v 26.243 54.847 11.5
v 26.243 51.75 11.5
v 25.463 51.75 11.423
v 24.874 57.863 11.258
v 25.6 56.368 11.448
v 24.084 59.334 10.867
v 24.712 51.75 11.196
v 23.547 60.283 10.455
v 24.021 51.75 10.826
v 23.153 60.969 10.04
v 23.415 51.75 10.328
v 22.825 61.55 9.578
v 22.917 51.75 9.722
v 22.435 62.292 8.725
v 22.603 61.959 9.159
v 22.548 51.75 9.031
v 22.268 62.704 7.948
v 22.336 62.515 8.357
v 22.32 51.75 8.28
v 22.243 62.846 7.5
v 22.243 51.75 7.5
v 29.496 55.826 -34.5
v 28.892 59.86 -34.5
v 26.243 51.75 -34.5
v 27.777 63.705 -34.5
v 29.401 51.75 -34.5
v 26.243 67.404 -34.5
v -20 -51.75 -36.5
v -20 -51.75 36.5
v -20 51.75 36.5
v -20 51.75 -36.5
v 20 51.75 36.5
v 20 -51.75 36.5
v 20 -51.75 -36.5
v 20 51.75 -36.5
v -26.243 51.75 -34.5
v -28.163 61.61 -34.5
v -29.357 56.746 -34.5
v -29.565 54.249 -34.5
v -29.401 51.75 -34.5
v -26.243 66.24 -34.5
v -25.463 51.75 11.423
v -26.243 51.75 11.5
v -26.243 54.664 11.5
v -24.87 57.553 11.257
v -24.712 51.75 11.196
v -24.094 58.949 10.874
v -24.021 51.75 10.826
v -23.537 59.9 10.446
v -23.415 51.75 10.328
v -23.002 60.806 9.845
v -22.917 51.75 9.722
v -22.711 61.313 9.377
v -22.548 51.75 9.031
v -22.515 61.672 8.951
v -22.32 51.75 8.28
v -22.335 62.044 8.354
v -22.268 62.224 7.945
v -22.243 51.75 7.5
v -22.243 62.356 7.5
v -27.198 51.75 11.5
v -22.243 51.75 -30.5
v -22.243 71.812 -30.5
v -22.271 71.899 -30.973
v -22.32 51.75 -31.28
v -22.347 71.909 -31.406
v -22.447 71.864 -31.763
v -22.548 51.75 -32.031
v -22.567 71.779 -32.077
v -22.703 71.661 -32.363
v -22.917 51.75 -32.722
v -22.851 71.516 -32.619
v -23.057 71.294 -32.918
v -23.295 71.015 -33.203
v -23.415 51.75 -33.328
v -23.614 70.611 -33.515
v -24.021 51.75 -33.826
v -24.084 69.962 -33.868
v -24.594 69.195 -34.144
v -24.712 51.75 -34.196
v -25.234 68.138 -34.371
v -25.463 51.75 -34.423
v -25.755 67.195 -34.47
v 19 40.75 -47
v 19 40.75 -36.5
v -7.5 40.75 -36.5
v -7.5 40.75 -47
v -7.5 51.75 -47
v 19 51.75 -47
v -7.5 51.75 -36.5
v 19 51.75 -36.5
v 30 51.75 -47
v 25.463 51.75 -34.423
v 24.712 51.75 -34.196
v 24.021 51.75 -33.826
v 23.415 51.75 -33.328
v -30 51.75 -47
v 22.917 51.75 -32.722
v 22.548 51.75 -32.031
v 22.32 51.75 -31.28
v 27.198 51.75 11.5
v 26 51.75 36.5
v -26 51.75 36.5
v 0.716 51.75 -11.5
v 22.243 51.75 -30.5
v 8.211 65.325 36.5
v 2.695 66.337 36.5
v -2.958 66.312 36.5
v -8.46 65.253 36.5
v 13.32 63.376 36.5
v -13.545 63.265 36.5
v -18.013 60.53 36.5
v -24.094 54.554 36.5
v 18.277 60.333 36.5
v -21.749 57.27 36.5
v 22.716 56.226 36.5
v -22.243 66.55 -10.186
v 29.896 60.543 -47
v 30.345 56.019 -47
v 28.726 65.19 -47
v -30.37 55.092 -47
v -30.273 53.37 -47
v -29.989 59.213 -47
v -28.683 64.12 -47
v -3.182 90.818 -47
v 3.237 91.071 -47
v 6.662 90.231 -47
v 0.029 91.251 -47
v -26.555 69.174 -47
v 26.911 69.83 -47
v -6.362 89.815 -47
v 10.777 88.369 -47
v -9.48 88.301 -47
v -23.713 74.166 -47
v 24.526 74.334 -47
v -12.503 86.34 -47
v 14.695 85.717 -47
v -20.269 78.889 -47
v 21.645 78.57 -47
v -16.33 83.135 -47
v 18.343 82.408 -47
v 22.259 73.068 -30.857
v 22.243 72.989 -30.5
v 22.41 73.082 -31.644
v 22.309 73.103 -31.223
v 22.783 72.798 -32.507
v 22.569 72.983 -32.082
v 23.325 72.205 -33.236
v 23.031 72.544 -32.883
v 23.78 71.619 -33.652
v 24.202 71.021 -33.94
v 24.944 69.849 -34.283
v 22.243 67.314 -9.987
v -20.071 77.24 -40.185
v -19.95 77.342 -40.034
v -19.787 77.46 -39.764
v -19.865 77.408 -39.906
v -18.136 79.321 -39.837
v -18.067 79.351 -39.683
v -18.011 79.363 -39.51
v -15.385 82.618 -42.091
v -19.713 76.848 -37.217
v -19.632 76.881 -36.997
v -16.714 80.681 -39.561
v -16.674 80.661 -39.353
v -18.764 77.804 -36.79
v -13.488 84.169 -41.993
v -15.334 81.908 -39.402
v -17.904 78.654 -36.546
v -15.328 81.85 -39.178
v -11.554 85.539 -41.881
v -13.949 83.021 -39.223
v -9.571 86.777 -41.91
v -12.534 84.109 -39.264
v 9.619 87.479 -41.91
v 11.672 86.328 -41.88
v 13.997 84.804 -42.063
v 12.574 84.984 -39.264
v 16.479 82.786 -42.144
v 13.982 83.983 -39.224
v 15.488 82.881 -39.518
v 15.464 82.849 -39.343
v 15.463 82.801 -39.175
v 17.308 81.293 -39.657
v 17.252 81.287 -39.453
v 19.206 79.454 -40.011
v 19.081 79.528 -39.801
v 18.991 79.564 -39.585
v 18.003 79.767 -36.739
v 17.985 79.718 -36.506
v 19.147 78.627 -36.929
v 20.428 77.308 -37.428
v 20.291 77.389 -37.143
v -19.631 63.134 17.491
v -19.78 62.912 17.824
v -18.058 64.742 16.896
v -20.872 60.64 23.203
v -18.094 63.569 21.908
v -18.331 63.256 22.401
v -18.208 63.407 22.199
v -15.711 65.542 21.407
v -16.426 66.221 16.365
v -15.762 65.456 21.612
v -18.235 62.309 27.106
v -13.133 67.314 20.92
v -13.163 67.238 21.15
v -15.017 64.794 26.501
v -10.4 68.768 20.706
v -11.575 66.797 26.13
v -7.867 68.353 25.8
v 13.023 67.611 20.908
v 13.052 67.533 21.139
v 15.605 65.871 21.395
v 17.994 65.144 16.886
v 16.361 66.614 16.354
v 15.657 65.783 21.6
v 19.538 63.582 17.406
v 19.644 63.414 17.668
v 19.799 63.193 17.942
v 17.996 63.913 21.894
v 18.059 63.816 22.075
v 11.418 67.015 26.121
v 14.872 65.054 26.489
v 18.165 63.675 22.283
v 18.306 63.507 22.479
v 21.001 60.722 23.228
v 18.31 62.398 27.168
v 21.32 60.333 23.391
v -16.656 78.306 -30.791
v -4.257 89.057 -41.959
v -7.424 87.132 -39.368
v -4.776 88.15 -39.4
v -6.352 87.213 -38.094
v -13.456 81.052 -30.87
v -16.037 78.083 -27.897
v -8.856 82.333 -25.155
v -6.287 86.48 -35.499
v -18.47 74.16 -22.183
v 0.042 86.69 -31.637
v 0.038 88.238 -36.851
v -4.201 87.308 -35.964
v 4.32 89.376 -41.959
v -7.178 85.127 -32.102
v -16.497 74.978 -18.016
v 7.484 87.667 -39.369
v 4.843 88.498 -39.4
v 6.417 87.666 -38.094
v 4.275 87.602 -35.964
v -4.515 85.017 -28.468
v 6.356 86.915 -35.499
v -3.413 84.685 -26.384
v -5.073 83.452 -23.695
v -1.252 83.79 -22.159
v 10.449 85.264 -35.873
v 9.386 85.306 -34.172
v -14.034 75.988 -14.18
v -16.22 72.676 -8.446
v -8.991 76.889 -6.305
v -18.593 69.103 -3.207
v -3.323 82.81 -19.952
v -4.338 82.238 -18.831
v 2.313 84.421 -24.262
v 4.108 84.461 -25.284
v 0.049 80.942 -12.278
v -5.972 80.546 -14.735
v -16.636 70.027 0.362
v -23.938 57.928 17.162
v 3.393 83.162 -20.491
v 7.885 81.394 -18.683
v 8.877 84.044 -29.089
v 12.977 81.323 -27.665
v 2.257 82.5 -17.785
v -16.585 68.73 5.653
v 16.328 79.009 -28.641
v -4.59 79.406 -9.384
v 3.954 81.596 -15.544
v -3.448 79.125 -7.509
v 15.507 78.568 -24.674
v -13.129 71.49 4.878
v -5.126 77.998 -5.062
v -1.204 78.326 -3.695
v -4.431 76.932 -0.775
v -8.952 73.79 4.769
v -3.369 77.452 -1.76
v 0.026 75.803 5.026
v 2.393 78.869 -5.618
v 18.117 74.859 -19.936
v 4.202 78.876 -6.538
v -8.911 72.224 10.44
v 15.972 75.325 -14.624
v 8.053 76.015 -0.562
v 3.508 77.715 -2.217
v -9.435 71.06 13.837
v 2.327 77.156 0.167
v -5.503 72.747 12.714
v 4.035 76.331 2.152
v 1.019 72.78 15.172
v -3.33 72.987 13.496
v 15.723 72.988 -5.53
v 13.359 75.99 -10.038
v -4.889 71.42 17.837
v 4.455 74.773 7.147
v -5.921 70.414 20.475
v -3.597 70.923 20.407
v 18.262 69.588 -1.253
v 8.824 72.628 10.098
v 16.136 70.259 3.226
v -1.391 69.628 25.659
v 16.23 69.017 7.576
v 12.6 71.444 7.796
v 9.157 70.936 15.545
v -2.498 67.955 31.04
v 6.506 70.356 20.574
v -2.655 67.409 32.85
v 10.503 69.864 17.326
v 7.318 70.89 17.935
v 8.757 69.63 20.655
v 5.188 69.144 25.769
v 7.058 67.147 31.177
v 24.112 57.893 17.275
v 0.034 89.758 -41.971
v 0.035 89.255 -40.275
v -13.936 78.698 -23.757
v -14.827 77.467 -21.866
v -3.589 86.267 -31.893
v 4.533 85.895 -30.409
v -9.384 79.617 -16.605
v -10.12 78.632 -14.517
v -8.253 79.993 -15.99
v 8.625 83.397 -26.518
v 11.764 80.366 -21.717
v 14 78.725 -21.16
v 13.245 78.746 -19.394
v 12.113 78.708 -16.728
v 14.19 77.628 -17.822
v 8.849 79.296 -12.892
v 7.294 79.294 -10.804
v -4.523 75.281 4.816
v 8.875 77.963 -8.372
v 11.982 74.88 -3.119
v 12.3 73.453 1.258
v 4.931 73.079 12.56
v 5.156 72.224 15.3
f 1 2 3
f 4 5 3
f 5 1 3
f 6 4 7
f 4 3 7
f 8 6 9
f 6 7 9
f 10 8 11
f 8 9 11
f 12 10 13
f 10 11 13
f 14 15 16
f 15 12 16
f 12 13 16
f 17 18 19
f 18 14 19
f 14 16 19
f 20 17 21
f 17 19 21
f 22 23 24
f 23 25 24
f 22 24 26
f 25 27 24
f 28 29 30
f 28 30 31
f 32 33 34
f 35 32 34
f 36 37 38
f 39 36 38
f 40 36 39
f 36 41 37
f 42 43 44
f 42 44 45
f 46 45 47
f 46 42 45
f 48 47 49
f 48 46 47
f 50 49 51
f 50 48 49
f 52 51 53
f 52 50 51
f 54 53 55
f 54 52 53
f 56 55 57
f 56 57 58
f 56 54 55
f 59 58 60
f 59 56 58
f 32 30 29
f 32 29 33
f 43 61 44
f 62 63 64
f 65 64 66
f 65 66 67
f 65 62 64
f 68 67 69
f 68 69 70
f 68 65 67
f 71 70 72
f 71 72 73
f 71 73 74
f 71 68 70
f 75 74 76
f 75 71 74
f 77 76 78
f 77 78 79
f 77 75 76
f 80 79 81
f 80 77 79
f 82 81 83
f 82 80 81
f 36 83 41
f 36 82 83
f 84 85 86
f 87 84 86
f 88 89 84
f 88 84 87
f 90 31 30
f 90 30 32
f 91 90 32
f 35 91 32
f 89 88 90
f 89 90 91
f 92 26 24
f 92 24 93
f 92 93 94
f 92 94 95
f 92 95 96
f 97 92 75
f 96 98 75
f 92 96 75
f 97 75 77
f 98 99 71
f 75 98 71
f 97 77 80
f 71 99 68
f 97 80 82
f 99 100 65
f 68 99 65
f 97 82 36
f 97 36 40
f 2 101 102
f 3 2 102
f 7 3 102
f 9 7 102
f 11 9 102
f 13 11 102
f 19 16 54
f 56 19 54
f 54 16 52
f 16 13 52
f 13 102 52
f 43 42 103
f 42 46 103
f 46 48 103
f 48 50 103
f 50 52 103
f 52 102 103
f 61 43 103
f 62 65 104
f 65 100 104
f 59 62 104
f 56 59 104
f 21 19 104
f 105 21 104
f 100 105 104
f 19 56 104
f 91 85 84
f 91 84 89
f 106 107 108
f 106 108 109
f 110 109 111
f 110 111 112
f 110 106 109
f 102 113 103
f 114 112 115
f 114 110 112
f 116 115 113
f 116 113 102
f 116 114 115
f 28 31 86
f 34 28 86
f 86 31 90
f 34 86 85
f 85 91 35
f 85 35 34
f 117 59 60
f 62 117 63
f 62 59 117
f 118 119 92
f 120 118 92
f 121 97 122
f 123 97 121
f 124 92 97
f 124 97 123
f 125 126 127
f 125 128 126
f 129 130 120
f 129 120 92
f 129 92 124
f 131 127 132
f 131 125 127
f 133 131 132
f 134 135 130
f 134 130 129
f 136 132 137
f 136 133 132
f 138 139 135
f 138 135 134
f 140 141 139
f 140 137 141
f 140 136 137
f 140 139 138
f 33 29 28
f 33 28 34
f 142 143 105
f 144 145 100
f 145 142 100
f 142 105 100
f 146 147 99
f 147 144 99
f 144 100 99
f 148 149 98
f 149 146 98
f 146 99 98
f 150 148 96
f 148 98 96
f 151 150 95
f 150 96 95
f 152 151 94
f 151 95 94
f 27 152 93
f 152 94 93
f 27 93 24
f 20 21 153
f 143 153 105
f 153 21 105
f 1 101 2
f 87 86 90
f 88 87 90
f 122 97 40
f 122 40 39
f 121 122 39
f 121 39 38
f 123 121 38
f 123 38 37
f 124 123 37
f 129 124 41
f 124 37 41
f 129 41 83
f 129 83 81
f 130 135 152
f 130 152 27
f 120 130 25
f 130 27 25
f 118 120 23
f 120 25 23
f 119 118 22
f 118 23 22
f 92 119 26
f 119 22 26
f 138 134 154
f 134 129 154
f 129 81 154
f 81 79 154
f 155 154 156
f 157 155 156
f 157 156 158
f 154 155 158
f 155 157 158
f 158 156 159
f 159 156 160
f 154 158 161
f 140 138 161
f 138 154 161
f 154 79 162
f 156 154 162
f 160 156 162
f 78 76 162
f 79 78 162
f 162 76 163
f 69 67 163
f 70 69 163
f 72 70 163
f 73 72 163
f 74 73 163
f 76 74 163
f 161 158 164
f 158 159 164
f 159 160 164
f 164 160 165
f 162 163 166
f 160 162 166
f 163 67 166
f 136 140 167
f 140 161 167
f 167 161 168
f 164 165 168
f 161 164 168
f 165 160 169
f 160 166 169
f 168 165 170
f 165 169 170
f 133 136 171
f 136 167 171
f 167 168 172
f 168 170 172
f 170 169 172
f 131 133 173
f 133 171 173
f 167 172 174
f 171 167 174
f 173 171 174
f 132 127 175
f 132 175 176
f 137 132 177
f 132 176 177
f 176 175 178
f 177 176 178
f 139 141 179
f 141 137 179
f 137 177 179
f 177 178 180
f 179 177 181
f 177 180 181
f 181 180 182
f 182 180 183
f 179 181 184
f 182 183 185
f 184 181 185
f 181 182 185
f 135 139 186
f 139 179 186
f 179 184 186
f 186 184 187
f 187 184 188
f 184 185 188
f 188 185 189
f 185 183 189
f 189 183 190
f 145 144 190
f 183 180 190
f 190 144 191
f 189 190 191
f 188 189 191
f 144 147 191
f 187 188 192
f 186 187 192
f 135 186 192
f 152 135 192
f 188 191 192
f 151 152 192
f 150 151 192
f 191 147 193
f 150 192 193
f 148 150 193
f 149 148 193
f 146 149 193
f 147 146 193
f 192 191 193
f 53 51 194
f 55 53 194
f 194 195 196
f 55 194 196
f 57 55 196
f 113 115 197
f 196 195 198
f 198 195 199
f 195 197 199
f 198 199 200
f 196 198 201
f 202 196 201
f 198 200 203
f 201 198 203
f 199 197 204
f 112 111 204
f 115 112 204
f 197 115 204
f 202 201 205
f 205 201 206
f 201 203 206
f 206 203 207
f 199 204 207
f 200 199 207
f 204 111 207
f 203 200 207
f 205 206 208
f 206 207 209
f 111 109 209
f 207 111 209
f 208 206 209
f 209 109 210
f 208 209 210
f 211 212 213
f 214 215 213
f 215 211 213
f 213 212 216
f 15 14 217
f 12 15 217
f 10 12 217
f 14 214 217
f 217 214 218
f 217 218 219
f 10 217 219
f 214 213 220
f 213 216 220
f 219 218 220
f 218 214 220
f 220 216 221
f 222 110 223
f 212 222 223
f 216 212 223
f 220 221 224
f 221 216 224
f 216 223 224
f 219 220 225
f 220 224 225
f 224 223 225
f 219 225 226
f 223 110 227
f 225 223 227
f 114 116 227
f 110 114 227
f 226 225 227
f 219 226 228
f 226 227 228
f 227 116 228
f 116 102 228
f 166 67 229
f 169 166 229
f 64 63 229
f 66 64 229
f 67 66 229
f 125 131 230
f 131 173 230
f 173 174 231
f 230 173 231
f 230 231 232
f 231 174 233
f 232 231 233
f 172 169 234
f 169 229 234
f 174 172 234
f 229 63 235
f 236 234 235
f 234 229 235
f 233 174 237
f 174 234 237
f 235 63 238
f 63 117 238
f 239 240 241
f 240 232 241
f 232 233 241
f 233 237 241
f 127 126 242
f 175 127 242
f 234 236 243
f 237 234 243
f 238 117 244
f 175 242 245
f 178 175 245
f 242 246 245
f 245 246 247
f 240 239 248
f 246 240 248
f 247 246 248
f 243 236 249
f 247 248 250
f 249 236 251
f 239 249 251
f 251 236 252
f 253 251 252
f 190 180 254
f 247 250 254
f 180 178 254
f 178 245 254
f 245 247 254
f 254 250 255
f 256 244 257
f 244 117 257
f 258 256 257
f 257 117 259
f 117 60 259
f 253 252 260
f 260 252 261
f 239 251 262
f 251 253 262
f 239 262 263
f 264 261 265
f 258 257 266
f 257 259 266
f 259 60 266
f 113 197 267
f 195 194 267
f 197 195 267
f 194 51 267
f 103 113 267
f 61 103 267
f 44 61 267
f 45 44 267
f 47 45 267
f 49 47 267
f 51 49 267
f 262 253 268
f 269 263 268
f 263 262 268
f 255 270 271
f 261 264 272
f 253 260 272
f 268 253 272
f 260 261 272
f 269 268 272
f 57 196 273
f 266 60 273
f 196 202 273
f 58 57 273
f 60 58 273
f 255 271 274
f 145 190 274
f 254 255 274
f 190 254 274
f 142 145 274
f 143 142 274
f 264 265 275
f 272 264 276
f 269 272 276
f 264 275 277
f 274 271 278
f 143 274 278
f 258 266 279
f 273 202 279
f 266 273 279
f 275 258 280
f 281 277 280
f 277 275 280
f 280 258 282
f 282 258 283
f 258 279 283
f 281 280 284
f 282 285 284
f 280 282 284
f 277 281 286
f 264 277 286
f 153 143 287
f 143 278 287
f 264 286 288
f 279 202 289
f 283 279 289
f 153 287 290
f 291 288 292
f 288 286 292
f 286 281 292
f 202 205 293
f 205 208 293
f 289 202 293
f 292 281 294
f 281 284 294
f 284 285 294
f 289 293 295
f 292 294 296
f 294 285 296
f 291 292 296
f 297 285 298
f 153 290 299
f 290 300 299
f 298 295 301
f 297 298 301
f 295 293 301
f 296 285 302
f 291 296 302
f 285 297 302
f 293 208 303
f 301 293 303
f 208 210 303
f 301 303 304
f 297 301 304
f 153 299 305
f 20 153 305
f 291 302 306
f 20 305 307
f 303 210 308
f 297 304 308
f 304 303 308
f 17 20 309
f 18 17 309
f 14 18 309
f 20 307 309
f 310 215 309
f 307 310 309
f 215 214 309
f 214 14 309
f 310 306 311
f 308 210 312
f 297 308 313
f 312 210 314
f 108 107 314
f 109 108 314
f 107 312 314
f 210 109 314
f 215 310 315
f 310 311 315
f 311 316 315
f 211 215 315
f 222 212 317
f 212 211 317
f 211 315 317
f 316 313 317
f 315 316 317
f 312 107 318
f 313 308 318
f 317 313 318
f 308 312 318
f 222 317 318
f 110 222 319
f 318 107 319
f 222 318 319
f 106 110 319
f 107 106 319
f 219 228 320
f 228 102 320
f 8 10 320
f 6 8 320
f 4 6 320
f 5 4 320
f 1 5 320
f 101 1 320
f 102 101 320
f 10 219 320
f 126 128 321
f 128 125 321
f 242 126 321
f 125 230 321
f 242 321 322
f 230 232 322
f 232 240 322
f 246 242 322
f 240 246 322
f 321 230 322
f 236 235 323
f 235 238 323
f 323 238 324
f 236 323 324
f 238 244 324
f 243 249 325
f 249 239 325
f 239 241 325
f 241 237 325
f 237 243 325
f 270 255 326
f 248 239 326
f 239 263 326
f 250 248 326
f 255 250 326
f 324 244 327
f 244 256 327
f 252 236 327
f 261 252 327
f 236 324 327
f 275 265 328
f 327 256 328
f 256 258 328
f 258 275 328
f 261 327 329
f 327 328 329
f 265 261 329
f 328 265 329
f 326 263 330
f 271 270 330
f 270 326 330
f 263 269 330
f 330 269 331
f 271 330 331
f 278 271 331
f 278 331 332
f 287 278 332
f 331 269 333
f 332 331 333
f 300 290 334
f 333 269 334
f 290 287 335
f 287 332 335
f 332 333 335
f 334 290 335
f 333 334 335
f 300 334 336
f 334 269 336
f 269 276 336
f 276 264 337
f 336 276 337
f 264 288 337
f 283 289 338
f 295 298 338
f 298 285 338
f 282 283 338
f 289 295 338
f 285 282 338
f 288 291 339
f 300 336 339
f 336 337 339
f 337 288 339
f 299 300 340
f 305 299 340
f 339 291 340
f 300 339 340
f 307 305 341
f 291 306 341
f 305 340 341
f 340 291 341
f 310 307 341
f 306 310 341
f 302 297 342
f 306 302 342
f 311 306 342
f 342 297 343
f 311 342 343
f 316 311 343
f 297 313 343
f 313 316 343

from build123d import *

# Parameters (mm, degrees)
SKETCH_1_W          = 40
SKETCH_1_H          = 73
EXTRUDE_1_DEPTH     = 51.75
SKETCH_2_W          = 26.5
SKETCH_2_H          = 11
EXTRUDE_2_DEPTH     = 10.5
CUT_EXTRUDE_1_DEPTH = 118.658825115


with BuildPart() as part:
    # 草图1 → 凸台-拉伸1 (new, symmetric)
    with BuildSketch(Plane(origin=(0, 0, 0), x_dir=(1, 0, 0), z_dir=(0, 1, 0))):
        Rectangle(SKETCH_1_W, SKETCH_1_H)
    extrude(amount=EXTRUDE_1_DEPTH, both=True)

    # 草图2 → 凸台-拉伸2 (add)
    with BuildSketch(Plane(origin=(0, 0, -36.5), x_dir=(-1, 0, 0), z_dir=(0, 0, -1))):
        with Locations((-5.75, 46.25)):
            Rectangle(SKETCH_2_W, SKETCH_2_H)
    extrude(amount=EXTRUDE_2_DEPTH)


with BuildPart() as body_2:
    # 草图3 → 放样1 section 0
    with BuildSketch(Plane(origin=(0, 0, -47), x_dir=(-1, 0, 0), z_dir=(0, 0, -1))):
        with BuildLine():
            Line((-30, 51.75), (30, 51.75))
            add(Edge.make_bspline(
                [(-30, 51.75), (-32.960840364, 67.552970125), (-0.122307099, 116.257852524), (33.072086404, 64.936710937), (30, 51.75)],
                knots=[0, 0, 0, 0, 0.500504929, 1, 1, 1, 1], degree=3))
        make_face()
    # 草图4 for 放样1 → 放样1 section 1
    with BuildSketch(Plane.XY.offset(36.5)):
        with BuildLine():
            Line((-26, 51.75), (26, 51.75))
            # circular arc as an exact rational Bezier (weights 1, cos(half-angle), 1)
            Bezier((26, 51.75), (0, 95.0040341), (-26, 51.75), weights=[1, 0.515188813, 1])
        make_face()
    loft()

    # 草图5 → 切除-拉伸1 (cut, through all)
    with BuildSketch(Plane.XZ.offset(-51.75)):
        with BuildLine():
            Line((-27.341317365, 11.5), (-26.243023445, 11.5))
            ThreePointArc((-26.243023445, 11.5), (-23.41459632, 10.328427125), (-22.243023445, 7.5))
            Line((-22.243023445, 7.5), (-22.243023445, -30.5))
            ThreePointArc((-22.243023445, -30.5), (-23.41459632, -33.328427125), (-26.243023445, -34.5))
            Line((-26.243023445, -34.5), (-29.401197605, -34.5))
            Line((-29.401197605, -34.5), (-36.989276173, -34.5))
            Line((-36.989276173, -34.5), (-36.989276173, 12.347472548))
            Line((-36.989276173, 12.347472548), (-27.341317365, 11.5))
        make_face()
        with BuildLine():
            Line((36.989276173, 12.347472548), (27.341317365, 11.5))
            Line((27.341317365, 11.5), (26.243023445, 11.5))
            ThreePointArc((26.243023445, 11.5), (23.41459632, 10.328427125), (22.243023445, 7.5))
            Line((22.243023445, 7.5), (22.243023445, -30.5))
            ThreePointArc((22.243023445, -30.5), (23.41459632, -33.328427125), (26.243023445, -34.5))
            Line((26.243023445, -34.5), (29.401197605, -34.5))
            Line((29.401197605, -34.5), (36.989276173, -34.5))
            Line((36.989276173, -34.5), (36.989276173, 12.347472548))
        make_face()
    extrude(amount=-CUT_EXTRUDE_1_DEPTH, mode=Mode.SUBTRACT)


solid = Compound([part.part, body_2.part])
